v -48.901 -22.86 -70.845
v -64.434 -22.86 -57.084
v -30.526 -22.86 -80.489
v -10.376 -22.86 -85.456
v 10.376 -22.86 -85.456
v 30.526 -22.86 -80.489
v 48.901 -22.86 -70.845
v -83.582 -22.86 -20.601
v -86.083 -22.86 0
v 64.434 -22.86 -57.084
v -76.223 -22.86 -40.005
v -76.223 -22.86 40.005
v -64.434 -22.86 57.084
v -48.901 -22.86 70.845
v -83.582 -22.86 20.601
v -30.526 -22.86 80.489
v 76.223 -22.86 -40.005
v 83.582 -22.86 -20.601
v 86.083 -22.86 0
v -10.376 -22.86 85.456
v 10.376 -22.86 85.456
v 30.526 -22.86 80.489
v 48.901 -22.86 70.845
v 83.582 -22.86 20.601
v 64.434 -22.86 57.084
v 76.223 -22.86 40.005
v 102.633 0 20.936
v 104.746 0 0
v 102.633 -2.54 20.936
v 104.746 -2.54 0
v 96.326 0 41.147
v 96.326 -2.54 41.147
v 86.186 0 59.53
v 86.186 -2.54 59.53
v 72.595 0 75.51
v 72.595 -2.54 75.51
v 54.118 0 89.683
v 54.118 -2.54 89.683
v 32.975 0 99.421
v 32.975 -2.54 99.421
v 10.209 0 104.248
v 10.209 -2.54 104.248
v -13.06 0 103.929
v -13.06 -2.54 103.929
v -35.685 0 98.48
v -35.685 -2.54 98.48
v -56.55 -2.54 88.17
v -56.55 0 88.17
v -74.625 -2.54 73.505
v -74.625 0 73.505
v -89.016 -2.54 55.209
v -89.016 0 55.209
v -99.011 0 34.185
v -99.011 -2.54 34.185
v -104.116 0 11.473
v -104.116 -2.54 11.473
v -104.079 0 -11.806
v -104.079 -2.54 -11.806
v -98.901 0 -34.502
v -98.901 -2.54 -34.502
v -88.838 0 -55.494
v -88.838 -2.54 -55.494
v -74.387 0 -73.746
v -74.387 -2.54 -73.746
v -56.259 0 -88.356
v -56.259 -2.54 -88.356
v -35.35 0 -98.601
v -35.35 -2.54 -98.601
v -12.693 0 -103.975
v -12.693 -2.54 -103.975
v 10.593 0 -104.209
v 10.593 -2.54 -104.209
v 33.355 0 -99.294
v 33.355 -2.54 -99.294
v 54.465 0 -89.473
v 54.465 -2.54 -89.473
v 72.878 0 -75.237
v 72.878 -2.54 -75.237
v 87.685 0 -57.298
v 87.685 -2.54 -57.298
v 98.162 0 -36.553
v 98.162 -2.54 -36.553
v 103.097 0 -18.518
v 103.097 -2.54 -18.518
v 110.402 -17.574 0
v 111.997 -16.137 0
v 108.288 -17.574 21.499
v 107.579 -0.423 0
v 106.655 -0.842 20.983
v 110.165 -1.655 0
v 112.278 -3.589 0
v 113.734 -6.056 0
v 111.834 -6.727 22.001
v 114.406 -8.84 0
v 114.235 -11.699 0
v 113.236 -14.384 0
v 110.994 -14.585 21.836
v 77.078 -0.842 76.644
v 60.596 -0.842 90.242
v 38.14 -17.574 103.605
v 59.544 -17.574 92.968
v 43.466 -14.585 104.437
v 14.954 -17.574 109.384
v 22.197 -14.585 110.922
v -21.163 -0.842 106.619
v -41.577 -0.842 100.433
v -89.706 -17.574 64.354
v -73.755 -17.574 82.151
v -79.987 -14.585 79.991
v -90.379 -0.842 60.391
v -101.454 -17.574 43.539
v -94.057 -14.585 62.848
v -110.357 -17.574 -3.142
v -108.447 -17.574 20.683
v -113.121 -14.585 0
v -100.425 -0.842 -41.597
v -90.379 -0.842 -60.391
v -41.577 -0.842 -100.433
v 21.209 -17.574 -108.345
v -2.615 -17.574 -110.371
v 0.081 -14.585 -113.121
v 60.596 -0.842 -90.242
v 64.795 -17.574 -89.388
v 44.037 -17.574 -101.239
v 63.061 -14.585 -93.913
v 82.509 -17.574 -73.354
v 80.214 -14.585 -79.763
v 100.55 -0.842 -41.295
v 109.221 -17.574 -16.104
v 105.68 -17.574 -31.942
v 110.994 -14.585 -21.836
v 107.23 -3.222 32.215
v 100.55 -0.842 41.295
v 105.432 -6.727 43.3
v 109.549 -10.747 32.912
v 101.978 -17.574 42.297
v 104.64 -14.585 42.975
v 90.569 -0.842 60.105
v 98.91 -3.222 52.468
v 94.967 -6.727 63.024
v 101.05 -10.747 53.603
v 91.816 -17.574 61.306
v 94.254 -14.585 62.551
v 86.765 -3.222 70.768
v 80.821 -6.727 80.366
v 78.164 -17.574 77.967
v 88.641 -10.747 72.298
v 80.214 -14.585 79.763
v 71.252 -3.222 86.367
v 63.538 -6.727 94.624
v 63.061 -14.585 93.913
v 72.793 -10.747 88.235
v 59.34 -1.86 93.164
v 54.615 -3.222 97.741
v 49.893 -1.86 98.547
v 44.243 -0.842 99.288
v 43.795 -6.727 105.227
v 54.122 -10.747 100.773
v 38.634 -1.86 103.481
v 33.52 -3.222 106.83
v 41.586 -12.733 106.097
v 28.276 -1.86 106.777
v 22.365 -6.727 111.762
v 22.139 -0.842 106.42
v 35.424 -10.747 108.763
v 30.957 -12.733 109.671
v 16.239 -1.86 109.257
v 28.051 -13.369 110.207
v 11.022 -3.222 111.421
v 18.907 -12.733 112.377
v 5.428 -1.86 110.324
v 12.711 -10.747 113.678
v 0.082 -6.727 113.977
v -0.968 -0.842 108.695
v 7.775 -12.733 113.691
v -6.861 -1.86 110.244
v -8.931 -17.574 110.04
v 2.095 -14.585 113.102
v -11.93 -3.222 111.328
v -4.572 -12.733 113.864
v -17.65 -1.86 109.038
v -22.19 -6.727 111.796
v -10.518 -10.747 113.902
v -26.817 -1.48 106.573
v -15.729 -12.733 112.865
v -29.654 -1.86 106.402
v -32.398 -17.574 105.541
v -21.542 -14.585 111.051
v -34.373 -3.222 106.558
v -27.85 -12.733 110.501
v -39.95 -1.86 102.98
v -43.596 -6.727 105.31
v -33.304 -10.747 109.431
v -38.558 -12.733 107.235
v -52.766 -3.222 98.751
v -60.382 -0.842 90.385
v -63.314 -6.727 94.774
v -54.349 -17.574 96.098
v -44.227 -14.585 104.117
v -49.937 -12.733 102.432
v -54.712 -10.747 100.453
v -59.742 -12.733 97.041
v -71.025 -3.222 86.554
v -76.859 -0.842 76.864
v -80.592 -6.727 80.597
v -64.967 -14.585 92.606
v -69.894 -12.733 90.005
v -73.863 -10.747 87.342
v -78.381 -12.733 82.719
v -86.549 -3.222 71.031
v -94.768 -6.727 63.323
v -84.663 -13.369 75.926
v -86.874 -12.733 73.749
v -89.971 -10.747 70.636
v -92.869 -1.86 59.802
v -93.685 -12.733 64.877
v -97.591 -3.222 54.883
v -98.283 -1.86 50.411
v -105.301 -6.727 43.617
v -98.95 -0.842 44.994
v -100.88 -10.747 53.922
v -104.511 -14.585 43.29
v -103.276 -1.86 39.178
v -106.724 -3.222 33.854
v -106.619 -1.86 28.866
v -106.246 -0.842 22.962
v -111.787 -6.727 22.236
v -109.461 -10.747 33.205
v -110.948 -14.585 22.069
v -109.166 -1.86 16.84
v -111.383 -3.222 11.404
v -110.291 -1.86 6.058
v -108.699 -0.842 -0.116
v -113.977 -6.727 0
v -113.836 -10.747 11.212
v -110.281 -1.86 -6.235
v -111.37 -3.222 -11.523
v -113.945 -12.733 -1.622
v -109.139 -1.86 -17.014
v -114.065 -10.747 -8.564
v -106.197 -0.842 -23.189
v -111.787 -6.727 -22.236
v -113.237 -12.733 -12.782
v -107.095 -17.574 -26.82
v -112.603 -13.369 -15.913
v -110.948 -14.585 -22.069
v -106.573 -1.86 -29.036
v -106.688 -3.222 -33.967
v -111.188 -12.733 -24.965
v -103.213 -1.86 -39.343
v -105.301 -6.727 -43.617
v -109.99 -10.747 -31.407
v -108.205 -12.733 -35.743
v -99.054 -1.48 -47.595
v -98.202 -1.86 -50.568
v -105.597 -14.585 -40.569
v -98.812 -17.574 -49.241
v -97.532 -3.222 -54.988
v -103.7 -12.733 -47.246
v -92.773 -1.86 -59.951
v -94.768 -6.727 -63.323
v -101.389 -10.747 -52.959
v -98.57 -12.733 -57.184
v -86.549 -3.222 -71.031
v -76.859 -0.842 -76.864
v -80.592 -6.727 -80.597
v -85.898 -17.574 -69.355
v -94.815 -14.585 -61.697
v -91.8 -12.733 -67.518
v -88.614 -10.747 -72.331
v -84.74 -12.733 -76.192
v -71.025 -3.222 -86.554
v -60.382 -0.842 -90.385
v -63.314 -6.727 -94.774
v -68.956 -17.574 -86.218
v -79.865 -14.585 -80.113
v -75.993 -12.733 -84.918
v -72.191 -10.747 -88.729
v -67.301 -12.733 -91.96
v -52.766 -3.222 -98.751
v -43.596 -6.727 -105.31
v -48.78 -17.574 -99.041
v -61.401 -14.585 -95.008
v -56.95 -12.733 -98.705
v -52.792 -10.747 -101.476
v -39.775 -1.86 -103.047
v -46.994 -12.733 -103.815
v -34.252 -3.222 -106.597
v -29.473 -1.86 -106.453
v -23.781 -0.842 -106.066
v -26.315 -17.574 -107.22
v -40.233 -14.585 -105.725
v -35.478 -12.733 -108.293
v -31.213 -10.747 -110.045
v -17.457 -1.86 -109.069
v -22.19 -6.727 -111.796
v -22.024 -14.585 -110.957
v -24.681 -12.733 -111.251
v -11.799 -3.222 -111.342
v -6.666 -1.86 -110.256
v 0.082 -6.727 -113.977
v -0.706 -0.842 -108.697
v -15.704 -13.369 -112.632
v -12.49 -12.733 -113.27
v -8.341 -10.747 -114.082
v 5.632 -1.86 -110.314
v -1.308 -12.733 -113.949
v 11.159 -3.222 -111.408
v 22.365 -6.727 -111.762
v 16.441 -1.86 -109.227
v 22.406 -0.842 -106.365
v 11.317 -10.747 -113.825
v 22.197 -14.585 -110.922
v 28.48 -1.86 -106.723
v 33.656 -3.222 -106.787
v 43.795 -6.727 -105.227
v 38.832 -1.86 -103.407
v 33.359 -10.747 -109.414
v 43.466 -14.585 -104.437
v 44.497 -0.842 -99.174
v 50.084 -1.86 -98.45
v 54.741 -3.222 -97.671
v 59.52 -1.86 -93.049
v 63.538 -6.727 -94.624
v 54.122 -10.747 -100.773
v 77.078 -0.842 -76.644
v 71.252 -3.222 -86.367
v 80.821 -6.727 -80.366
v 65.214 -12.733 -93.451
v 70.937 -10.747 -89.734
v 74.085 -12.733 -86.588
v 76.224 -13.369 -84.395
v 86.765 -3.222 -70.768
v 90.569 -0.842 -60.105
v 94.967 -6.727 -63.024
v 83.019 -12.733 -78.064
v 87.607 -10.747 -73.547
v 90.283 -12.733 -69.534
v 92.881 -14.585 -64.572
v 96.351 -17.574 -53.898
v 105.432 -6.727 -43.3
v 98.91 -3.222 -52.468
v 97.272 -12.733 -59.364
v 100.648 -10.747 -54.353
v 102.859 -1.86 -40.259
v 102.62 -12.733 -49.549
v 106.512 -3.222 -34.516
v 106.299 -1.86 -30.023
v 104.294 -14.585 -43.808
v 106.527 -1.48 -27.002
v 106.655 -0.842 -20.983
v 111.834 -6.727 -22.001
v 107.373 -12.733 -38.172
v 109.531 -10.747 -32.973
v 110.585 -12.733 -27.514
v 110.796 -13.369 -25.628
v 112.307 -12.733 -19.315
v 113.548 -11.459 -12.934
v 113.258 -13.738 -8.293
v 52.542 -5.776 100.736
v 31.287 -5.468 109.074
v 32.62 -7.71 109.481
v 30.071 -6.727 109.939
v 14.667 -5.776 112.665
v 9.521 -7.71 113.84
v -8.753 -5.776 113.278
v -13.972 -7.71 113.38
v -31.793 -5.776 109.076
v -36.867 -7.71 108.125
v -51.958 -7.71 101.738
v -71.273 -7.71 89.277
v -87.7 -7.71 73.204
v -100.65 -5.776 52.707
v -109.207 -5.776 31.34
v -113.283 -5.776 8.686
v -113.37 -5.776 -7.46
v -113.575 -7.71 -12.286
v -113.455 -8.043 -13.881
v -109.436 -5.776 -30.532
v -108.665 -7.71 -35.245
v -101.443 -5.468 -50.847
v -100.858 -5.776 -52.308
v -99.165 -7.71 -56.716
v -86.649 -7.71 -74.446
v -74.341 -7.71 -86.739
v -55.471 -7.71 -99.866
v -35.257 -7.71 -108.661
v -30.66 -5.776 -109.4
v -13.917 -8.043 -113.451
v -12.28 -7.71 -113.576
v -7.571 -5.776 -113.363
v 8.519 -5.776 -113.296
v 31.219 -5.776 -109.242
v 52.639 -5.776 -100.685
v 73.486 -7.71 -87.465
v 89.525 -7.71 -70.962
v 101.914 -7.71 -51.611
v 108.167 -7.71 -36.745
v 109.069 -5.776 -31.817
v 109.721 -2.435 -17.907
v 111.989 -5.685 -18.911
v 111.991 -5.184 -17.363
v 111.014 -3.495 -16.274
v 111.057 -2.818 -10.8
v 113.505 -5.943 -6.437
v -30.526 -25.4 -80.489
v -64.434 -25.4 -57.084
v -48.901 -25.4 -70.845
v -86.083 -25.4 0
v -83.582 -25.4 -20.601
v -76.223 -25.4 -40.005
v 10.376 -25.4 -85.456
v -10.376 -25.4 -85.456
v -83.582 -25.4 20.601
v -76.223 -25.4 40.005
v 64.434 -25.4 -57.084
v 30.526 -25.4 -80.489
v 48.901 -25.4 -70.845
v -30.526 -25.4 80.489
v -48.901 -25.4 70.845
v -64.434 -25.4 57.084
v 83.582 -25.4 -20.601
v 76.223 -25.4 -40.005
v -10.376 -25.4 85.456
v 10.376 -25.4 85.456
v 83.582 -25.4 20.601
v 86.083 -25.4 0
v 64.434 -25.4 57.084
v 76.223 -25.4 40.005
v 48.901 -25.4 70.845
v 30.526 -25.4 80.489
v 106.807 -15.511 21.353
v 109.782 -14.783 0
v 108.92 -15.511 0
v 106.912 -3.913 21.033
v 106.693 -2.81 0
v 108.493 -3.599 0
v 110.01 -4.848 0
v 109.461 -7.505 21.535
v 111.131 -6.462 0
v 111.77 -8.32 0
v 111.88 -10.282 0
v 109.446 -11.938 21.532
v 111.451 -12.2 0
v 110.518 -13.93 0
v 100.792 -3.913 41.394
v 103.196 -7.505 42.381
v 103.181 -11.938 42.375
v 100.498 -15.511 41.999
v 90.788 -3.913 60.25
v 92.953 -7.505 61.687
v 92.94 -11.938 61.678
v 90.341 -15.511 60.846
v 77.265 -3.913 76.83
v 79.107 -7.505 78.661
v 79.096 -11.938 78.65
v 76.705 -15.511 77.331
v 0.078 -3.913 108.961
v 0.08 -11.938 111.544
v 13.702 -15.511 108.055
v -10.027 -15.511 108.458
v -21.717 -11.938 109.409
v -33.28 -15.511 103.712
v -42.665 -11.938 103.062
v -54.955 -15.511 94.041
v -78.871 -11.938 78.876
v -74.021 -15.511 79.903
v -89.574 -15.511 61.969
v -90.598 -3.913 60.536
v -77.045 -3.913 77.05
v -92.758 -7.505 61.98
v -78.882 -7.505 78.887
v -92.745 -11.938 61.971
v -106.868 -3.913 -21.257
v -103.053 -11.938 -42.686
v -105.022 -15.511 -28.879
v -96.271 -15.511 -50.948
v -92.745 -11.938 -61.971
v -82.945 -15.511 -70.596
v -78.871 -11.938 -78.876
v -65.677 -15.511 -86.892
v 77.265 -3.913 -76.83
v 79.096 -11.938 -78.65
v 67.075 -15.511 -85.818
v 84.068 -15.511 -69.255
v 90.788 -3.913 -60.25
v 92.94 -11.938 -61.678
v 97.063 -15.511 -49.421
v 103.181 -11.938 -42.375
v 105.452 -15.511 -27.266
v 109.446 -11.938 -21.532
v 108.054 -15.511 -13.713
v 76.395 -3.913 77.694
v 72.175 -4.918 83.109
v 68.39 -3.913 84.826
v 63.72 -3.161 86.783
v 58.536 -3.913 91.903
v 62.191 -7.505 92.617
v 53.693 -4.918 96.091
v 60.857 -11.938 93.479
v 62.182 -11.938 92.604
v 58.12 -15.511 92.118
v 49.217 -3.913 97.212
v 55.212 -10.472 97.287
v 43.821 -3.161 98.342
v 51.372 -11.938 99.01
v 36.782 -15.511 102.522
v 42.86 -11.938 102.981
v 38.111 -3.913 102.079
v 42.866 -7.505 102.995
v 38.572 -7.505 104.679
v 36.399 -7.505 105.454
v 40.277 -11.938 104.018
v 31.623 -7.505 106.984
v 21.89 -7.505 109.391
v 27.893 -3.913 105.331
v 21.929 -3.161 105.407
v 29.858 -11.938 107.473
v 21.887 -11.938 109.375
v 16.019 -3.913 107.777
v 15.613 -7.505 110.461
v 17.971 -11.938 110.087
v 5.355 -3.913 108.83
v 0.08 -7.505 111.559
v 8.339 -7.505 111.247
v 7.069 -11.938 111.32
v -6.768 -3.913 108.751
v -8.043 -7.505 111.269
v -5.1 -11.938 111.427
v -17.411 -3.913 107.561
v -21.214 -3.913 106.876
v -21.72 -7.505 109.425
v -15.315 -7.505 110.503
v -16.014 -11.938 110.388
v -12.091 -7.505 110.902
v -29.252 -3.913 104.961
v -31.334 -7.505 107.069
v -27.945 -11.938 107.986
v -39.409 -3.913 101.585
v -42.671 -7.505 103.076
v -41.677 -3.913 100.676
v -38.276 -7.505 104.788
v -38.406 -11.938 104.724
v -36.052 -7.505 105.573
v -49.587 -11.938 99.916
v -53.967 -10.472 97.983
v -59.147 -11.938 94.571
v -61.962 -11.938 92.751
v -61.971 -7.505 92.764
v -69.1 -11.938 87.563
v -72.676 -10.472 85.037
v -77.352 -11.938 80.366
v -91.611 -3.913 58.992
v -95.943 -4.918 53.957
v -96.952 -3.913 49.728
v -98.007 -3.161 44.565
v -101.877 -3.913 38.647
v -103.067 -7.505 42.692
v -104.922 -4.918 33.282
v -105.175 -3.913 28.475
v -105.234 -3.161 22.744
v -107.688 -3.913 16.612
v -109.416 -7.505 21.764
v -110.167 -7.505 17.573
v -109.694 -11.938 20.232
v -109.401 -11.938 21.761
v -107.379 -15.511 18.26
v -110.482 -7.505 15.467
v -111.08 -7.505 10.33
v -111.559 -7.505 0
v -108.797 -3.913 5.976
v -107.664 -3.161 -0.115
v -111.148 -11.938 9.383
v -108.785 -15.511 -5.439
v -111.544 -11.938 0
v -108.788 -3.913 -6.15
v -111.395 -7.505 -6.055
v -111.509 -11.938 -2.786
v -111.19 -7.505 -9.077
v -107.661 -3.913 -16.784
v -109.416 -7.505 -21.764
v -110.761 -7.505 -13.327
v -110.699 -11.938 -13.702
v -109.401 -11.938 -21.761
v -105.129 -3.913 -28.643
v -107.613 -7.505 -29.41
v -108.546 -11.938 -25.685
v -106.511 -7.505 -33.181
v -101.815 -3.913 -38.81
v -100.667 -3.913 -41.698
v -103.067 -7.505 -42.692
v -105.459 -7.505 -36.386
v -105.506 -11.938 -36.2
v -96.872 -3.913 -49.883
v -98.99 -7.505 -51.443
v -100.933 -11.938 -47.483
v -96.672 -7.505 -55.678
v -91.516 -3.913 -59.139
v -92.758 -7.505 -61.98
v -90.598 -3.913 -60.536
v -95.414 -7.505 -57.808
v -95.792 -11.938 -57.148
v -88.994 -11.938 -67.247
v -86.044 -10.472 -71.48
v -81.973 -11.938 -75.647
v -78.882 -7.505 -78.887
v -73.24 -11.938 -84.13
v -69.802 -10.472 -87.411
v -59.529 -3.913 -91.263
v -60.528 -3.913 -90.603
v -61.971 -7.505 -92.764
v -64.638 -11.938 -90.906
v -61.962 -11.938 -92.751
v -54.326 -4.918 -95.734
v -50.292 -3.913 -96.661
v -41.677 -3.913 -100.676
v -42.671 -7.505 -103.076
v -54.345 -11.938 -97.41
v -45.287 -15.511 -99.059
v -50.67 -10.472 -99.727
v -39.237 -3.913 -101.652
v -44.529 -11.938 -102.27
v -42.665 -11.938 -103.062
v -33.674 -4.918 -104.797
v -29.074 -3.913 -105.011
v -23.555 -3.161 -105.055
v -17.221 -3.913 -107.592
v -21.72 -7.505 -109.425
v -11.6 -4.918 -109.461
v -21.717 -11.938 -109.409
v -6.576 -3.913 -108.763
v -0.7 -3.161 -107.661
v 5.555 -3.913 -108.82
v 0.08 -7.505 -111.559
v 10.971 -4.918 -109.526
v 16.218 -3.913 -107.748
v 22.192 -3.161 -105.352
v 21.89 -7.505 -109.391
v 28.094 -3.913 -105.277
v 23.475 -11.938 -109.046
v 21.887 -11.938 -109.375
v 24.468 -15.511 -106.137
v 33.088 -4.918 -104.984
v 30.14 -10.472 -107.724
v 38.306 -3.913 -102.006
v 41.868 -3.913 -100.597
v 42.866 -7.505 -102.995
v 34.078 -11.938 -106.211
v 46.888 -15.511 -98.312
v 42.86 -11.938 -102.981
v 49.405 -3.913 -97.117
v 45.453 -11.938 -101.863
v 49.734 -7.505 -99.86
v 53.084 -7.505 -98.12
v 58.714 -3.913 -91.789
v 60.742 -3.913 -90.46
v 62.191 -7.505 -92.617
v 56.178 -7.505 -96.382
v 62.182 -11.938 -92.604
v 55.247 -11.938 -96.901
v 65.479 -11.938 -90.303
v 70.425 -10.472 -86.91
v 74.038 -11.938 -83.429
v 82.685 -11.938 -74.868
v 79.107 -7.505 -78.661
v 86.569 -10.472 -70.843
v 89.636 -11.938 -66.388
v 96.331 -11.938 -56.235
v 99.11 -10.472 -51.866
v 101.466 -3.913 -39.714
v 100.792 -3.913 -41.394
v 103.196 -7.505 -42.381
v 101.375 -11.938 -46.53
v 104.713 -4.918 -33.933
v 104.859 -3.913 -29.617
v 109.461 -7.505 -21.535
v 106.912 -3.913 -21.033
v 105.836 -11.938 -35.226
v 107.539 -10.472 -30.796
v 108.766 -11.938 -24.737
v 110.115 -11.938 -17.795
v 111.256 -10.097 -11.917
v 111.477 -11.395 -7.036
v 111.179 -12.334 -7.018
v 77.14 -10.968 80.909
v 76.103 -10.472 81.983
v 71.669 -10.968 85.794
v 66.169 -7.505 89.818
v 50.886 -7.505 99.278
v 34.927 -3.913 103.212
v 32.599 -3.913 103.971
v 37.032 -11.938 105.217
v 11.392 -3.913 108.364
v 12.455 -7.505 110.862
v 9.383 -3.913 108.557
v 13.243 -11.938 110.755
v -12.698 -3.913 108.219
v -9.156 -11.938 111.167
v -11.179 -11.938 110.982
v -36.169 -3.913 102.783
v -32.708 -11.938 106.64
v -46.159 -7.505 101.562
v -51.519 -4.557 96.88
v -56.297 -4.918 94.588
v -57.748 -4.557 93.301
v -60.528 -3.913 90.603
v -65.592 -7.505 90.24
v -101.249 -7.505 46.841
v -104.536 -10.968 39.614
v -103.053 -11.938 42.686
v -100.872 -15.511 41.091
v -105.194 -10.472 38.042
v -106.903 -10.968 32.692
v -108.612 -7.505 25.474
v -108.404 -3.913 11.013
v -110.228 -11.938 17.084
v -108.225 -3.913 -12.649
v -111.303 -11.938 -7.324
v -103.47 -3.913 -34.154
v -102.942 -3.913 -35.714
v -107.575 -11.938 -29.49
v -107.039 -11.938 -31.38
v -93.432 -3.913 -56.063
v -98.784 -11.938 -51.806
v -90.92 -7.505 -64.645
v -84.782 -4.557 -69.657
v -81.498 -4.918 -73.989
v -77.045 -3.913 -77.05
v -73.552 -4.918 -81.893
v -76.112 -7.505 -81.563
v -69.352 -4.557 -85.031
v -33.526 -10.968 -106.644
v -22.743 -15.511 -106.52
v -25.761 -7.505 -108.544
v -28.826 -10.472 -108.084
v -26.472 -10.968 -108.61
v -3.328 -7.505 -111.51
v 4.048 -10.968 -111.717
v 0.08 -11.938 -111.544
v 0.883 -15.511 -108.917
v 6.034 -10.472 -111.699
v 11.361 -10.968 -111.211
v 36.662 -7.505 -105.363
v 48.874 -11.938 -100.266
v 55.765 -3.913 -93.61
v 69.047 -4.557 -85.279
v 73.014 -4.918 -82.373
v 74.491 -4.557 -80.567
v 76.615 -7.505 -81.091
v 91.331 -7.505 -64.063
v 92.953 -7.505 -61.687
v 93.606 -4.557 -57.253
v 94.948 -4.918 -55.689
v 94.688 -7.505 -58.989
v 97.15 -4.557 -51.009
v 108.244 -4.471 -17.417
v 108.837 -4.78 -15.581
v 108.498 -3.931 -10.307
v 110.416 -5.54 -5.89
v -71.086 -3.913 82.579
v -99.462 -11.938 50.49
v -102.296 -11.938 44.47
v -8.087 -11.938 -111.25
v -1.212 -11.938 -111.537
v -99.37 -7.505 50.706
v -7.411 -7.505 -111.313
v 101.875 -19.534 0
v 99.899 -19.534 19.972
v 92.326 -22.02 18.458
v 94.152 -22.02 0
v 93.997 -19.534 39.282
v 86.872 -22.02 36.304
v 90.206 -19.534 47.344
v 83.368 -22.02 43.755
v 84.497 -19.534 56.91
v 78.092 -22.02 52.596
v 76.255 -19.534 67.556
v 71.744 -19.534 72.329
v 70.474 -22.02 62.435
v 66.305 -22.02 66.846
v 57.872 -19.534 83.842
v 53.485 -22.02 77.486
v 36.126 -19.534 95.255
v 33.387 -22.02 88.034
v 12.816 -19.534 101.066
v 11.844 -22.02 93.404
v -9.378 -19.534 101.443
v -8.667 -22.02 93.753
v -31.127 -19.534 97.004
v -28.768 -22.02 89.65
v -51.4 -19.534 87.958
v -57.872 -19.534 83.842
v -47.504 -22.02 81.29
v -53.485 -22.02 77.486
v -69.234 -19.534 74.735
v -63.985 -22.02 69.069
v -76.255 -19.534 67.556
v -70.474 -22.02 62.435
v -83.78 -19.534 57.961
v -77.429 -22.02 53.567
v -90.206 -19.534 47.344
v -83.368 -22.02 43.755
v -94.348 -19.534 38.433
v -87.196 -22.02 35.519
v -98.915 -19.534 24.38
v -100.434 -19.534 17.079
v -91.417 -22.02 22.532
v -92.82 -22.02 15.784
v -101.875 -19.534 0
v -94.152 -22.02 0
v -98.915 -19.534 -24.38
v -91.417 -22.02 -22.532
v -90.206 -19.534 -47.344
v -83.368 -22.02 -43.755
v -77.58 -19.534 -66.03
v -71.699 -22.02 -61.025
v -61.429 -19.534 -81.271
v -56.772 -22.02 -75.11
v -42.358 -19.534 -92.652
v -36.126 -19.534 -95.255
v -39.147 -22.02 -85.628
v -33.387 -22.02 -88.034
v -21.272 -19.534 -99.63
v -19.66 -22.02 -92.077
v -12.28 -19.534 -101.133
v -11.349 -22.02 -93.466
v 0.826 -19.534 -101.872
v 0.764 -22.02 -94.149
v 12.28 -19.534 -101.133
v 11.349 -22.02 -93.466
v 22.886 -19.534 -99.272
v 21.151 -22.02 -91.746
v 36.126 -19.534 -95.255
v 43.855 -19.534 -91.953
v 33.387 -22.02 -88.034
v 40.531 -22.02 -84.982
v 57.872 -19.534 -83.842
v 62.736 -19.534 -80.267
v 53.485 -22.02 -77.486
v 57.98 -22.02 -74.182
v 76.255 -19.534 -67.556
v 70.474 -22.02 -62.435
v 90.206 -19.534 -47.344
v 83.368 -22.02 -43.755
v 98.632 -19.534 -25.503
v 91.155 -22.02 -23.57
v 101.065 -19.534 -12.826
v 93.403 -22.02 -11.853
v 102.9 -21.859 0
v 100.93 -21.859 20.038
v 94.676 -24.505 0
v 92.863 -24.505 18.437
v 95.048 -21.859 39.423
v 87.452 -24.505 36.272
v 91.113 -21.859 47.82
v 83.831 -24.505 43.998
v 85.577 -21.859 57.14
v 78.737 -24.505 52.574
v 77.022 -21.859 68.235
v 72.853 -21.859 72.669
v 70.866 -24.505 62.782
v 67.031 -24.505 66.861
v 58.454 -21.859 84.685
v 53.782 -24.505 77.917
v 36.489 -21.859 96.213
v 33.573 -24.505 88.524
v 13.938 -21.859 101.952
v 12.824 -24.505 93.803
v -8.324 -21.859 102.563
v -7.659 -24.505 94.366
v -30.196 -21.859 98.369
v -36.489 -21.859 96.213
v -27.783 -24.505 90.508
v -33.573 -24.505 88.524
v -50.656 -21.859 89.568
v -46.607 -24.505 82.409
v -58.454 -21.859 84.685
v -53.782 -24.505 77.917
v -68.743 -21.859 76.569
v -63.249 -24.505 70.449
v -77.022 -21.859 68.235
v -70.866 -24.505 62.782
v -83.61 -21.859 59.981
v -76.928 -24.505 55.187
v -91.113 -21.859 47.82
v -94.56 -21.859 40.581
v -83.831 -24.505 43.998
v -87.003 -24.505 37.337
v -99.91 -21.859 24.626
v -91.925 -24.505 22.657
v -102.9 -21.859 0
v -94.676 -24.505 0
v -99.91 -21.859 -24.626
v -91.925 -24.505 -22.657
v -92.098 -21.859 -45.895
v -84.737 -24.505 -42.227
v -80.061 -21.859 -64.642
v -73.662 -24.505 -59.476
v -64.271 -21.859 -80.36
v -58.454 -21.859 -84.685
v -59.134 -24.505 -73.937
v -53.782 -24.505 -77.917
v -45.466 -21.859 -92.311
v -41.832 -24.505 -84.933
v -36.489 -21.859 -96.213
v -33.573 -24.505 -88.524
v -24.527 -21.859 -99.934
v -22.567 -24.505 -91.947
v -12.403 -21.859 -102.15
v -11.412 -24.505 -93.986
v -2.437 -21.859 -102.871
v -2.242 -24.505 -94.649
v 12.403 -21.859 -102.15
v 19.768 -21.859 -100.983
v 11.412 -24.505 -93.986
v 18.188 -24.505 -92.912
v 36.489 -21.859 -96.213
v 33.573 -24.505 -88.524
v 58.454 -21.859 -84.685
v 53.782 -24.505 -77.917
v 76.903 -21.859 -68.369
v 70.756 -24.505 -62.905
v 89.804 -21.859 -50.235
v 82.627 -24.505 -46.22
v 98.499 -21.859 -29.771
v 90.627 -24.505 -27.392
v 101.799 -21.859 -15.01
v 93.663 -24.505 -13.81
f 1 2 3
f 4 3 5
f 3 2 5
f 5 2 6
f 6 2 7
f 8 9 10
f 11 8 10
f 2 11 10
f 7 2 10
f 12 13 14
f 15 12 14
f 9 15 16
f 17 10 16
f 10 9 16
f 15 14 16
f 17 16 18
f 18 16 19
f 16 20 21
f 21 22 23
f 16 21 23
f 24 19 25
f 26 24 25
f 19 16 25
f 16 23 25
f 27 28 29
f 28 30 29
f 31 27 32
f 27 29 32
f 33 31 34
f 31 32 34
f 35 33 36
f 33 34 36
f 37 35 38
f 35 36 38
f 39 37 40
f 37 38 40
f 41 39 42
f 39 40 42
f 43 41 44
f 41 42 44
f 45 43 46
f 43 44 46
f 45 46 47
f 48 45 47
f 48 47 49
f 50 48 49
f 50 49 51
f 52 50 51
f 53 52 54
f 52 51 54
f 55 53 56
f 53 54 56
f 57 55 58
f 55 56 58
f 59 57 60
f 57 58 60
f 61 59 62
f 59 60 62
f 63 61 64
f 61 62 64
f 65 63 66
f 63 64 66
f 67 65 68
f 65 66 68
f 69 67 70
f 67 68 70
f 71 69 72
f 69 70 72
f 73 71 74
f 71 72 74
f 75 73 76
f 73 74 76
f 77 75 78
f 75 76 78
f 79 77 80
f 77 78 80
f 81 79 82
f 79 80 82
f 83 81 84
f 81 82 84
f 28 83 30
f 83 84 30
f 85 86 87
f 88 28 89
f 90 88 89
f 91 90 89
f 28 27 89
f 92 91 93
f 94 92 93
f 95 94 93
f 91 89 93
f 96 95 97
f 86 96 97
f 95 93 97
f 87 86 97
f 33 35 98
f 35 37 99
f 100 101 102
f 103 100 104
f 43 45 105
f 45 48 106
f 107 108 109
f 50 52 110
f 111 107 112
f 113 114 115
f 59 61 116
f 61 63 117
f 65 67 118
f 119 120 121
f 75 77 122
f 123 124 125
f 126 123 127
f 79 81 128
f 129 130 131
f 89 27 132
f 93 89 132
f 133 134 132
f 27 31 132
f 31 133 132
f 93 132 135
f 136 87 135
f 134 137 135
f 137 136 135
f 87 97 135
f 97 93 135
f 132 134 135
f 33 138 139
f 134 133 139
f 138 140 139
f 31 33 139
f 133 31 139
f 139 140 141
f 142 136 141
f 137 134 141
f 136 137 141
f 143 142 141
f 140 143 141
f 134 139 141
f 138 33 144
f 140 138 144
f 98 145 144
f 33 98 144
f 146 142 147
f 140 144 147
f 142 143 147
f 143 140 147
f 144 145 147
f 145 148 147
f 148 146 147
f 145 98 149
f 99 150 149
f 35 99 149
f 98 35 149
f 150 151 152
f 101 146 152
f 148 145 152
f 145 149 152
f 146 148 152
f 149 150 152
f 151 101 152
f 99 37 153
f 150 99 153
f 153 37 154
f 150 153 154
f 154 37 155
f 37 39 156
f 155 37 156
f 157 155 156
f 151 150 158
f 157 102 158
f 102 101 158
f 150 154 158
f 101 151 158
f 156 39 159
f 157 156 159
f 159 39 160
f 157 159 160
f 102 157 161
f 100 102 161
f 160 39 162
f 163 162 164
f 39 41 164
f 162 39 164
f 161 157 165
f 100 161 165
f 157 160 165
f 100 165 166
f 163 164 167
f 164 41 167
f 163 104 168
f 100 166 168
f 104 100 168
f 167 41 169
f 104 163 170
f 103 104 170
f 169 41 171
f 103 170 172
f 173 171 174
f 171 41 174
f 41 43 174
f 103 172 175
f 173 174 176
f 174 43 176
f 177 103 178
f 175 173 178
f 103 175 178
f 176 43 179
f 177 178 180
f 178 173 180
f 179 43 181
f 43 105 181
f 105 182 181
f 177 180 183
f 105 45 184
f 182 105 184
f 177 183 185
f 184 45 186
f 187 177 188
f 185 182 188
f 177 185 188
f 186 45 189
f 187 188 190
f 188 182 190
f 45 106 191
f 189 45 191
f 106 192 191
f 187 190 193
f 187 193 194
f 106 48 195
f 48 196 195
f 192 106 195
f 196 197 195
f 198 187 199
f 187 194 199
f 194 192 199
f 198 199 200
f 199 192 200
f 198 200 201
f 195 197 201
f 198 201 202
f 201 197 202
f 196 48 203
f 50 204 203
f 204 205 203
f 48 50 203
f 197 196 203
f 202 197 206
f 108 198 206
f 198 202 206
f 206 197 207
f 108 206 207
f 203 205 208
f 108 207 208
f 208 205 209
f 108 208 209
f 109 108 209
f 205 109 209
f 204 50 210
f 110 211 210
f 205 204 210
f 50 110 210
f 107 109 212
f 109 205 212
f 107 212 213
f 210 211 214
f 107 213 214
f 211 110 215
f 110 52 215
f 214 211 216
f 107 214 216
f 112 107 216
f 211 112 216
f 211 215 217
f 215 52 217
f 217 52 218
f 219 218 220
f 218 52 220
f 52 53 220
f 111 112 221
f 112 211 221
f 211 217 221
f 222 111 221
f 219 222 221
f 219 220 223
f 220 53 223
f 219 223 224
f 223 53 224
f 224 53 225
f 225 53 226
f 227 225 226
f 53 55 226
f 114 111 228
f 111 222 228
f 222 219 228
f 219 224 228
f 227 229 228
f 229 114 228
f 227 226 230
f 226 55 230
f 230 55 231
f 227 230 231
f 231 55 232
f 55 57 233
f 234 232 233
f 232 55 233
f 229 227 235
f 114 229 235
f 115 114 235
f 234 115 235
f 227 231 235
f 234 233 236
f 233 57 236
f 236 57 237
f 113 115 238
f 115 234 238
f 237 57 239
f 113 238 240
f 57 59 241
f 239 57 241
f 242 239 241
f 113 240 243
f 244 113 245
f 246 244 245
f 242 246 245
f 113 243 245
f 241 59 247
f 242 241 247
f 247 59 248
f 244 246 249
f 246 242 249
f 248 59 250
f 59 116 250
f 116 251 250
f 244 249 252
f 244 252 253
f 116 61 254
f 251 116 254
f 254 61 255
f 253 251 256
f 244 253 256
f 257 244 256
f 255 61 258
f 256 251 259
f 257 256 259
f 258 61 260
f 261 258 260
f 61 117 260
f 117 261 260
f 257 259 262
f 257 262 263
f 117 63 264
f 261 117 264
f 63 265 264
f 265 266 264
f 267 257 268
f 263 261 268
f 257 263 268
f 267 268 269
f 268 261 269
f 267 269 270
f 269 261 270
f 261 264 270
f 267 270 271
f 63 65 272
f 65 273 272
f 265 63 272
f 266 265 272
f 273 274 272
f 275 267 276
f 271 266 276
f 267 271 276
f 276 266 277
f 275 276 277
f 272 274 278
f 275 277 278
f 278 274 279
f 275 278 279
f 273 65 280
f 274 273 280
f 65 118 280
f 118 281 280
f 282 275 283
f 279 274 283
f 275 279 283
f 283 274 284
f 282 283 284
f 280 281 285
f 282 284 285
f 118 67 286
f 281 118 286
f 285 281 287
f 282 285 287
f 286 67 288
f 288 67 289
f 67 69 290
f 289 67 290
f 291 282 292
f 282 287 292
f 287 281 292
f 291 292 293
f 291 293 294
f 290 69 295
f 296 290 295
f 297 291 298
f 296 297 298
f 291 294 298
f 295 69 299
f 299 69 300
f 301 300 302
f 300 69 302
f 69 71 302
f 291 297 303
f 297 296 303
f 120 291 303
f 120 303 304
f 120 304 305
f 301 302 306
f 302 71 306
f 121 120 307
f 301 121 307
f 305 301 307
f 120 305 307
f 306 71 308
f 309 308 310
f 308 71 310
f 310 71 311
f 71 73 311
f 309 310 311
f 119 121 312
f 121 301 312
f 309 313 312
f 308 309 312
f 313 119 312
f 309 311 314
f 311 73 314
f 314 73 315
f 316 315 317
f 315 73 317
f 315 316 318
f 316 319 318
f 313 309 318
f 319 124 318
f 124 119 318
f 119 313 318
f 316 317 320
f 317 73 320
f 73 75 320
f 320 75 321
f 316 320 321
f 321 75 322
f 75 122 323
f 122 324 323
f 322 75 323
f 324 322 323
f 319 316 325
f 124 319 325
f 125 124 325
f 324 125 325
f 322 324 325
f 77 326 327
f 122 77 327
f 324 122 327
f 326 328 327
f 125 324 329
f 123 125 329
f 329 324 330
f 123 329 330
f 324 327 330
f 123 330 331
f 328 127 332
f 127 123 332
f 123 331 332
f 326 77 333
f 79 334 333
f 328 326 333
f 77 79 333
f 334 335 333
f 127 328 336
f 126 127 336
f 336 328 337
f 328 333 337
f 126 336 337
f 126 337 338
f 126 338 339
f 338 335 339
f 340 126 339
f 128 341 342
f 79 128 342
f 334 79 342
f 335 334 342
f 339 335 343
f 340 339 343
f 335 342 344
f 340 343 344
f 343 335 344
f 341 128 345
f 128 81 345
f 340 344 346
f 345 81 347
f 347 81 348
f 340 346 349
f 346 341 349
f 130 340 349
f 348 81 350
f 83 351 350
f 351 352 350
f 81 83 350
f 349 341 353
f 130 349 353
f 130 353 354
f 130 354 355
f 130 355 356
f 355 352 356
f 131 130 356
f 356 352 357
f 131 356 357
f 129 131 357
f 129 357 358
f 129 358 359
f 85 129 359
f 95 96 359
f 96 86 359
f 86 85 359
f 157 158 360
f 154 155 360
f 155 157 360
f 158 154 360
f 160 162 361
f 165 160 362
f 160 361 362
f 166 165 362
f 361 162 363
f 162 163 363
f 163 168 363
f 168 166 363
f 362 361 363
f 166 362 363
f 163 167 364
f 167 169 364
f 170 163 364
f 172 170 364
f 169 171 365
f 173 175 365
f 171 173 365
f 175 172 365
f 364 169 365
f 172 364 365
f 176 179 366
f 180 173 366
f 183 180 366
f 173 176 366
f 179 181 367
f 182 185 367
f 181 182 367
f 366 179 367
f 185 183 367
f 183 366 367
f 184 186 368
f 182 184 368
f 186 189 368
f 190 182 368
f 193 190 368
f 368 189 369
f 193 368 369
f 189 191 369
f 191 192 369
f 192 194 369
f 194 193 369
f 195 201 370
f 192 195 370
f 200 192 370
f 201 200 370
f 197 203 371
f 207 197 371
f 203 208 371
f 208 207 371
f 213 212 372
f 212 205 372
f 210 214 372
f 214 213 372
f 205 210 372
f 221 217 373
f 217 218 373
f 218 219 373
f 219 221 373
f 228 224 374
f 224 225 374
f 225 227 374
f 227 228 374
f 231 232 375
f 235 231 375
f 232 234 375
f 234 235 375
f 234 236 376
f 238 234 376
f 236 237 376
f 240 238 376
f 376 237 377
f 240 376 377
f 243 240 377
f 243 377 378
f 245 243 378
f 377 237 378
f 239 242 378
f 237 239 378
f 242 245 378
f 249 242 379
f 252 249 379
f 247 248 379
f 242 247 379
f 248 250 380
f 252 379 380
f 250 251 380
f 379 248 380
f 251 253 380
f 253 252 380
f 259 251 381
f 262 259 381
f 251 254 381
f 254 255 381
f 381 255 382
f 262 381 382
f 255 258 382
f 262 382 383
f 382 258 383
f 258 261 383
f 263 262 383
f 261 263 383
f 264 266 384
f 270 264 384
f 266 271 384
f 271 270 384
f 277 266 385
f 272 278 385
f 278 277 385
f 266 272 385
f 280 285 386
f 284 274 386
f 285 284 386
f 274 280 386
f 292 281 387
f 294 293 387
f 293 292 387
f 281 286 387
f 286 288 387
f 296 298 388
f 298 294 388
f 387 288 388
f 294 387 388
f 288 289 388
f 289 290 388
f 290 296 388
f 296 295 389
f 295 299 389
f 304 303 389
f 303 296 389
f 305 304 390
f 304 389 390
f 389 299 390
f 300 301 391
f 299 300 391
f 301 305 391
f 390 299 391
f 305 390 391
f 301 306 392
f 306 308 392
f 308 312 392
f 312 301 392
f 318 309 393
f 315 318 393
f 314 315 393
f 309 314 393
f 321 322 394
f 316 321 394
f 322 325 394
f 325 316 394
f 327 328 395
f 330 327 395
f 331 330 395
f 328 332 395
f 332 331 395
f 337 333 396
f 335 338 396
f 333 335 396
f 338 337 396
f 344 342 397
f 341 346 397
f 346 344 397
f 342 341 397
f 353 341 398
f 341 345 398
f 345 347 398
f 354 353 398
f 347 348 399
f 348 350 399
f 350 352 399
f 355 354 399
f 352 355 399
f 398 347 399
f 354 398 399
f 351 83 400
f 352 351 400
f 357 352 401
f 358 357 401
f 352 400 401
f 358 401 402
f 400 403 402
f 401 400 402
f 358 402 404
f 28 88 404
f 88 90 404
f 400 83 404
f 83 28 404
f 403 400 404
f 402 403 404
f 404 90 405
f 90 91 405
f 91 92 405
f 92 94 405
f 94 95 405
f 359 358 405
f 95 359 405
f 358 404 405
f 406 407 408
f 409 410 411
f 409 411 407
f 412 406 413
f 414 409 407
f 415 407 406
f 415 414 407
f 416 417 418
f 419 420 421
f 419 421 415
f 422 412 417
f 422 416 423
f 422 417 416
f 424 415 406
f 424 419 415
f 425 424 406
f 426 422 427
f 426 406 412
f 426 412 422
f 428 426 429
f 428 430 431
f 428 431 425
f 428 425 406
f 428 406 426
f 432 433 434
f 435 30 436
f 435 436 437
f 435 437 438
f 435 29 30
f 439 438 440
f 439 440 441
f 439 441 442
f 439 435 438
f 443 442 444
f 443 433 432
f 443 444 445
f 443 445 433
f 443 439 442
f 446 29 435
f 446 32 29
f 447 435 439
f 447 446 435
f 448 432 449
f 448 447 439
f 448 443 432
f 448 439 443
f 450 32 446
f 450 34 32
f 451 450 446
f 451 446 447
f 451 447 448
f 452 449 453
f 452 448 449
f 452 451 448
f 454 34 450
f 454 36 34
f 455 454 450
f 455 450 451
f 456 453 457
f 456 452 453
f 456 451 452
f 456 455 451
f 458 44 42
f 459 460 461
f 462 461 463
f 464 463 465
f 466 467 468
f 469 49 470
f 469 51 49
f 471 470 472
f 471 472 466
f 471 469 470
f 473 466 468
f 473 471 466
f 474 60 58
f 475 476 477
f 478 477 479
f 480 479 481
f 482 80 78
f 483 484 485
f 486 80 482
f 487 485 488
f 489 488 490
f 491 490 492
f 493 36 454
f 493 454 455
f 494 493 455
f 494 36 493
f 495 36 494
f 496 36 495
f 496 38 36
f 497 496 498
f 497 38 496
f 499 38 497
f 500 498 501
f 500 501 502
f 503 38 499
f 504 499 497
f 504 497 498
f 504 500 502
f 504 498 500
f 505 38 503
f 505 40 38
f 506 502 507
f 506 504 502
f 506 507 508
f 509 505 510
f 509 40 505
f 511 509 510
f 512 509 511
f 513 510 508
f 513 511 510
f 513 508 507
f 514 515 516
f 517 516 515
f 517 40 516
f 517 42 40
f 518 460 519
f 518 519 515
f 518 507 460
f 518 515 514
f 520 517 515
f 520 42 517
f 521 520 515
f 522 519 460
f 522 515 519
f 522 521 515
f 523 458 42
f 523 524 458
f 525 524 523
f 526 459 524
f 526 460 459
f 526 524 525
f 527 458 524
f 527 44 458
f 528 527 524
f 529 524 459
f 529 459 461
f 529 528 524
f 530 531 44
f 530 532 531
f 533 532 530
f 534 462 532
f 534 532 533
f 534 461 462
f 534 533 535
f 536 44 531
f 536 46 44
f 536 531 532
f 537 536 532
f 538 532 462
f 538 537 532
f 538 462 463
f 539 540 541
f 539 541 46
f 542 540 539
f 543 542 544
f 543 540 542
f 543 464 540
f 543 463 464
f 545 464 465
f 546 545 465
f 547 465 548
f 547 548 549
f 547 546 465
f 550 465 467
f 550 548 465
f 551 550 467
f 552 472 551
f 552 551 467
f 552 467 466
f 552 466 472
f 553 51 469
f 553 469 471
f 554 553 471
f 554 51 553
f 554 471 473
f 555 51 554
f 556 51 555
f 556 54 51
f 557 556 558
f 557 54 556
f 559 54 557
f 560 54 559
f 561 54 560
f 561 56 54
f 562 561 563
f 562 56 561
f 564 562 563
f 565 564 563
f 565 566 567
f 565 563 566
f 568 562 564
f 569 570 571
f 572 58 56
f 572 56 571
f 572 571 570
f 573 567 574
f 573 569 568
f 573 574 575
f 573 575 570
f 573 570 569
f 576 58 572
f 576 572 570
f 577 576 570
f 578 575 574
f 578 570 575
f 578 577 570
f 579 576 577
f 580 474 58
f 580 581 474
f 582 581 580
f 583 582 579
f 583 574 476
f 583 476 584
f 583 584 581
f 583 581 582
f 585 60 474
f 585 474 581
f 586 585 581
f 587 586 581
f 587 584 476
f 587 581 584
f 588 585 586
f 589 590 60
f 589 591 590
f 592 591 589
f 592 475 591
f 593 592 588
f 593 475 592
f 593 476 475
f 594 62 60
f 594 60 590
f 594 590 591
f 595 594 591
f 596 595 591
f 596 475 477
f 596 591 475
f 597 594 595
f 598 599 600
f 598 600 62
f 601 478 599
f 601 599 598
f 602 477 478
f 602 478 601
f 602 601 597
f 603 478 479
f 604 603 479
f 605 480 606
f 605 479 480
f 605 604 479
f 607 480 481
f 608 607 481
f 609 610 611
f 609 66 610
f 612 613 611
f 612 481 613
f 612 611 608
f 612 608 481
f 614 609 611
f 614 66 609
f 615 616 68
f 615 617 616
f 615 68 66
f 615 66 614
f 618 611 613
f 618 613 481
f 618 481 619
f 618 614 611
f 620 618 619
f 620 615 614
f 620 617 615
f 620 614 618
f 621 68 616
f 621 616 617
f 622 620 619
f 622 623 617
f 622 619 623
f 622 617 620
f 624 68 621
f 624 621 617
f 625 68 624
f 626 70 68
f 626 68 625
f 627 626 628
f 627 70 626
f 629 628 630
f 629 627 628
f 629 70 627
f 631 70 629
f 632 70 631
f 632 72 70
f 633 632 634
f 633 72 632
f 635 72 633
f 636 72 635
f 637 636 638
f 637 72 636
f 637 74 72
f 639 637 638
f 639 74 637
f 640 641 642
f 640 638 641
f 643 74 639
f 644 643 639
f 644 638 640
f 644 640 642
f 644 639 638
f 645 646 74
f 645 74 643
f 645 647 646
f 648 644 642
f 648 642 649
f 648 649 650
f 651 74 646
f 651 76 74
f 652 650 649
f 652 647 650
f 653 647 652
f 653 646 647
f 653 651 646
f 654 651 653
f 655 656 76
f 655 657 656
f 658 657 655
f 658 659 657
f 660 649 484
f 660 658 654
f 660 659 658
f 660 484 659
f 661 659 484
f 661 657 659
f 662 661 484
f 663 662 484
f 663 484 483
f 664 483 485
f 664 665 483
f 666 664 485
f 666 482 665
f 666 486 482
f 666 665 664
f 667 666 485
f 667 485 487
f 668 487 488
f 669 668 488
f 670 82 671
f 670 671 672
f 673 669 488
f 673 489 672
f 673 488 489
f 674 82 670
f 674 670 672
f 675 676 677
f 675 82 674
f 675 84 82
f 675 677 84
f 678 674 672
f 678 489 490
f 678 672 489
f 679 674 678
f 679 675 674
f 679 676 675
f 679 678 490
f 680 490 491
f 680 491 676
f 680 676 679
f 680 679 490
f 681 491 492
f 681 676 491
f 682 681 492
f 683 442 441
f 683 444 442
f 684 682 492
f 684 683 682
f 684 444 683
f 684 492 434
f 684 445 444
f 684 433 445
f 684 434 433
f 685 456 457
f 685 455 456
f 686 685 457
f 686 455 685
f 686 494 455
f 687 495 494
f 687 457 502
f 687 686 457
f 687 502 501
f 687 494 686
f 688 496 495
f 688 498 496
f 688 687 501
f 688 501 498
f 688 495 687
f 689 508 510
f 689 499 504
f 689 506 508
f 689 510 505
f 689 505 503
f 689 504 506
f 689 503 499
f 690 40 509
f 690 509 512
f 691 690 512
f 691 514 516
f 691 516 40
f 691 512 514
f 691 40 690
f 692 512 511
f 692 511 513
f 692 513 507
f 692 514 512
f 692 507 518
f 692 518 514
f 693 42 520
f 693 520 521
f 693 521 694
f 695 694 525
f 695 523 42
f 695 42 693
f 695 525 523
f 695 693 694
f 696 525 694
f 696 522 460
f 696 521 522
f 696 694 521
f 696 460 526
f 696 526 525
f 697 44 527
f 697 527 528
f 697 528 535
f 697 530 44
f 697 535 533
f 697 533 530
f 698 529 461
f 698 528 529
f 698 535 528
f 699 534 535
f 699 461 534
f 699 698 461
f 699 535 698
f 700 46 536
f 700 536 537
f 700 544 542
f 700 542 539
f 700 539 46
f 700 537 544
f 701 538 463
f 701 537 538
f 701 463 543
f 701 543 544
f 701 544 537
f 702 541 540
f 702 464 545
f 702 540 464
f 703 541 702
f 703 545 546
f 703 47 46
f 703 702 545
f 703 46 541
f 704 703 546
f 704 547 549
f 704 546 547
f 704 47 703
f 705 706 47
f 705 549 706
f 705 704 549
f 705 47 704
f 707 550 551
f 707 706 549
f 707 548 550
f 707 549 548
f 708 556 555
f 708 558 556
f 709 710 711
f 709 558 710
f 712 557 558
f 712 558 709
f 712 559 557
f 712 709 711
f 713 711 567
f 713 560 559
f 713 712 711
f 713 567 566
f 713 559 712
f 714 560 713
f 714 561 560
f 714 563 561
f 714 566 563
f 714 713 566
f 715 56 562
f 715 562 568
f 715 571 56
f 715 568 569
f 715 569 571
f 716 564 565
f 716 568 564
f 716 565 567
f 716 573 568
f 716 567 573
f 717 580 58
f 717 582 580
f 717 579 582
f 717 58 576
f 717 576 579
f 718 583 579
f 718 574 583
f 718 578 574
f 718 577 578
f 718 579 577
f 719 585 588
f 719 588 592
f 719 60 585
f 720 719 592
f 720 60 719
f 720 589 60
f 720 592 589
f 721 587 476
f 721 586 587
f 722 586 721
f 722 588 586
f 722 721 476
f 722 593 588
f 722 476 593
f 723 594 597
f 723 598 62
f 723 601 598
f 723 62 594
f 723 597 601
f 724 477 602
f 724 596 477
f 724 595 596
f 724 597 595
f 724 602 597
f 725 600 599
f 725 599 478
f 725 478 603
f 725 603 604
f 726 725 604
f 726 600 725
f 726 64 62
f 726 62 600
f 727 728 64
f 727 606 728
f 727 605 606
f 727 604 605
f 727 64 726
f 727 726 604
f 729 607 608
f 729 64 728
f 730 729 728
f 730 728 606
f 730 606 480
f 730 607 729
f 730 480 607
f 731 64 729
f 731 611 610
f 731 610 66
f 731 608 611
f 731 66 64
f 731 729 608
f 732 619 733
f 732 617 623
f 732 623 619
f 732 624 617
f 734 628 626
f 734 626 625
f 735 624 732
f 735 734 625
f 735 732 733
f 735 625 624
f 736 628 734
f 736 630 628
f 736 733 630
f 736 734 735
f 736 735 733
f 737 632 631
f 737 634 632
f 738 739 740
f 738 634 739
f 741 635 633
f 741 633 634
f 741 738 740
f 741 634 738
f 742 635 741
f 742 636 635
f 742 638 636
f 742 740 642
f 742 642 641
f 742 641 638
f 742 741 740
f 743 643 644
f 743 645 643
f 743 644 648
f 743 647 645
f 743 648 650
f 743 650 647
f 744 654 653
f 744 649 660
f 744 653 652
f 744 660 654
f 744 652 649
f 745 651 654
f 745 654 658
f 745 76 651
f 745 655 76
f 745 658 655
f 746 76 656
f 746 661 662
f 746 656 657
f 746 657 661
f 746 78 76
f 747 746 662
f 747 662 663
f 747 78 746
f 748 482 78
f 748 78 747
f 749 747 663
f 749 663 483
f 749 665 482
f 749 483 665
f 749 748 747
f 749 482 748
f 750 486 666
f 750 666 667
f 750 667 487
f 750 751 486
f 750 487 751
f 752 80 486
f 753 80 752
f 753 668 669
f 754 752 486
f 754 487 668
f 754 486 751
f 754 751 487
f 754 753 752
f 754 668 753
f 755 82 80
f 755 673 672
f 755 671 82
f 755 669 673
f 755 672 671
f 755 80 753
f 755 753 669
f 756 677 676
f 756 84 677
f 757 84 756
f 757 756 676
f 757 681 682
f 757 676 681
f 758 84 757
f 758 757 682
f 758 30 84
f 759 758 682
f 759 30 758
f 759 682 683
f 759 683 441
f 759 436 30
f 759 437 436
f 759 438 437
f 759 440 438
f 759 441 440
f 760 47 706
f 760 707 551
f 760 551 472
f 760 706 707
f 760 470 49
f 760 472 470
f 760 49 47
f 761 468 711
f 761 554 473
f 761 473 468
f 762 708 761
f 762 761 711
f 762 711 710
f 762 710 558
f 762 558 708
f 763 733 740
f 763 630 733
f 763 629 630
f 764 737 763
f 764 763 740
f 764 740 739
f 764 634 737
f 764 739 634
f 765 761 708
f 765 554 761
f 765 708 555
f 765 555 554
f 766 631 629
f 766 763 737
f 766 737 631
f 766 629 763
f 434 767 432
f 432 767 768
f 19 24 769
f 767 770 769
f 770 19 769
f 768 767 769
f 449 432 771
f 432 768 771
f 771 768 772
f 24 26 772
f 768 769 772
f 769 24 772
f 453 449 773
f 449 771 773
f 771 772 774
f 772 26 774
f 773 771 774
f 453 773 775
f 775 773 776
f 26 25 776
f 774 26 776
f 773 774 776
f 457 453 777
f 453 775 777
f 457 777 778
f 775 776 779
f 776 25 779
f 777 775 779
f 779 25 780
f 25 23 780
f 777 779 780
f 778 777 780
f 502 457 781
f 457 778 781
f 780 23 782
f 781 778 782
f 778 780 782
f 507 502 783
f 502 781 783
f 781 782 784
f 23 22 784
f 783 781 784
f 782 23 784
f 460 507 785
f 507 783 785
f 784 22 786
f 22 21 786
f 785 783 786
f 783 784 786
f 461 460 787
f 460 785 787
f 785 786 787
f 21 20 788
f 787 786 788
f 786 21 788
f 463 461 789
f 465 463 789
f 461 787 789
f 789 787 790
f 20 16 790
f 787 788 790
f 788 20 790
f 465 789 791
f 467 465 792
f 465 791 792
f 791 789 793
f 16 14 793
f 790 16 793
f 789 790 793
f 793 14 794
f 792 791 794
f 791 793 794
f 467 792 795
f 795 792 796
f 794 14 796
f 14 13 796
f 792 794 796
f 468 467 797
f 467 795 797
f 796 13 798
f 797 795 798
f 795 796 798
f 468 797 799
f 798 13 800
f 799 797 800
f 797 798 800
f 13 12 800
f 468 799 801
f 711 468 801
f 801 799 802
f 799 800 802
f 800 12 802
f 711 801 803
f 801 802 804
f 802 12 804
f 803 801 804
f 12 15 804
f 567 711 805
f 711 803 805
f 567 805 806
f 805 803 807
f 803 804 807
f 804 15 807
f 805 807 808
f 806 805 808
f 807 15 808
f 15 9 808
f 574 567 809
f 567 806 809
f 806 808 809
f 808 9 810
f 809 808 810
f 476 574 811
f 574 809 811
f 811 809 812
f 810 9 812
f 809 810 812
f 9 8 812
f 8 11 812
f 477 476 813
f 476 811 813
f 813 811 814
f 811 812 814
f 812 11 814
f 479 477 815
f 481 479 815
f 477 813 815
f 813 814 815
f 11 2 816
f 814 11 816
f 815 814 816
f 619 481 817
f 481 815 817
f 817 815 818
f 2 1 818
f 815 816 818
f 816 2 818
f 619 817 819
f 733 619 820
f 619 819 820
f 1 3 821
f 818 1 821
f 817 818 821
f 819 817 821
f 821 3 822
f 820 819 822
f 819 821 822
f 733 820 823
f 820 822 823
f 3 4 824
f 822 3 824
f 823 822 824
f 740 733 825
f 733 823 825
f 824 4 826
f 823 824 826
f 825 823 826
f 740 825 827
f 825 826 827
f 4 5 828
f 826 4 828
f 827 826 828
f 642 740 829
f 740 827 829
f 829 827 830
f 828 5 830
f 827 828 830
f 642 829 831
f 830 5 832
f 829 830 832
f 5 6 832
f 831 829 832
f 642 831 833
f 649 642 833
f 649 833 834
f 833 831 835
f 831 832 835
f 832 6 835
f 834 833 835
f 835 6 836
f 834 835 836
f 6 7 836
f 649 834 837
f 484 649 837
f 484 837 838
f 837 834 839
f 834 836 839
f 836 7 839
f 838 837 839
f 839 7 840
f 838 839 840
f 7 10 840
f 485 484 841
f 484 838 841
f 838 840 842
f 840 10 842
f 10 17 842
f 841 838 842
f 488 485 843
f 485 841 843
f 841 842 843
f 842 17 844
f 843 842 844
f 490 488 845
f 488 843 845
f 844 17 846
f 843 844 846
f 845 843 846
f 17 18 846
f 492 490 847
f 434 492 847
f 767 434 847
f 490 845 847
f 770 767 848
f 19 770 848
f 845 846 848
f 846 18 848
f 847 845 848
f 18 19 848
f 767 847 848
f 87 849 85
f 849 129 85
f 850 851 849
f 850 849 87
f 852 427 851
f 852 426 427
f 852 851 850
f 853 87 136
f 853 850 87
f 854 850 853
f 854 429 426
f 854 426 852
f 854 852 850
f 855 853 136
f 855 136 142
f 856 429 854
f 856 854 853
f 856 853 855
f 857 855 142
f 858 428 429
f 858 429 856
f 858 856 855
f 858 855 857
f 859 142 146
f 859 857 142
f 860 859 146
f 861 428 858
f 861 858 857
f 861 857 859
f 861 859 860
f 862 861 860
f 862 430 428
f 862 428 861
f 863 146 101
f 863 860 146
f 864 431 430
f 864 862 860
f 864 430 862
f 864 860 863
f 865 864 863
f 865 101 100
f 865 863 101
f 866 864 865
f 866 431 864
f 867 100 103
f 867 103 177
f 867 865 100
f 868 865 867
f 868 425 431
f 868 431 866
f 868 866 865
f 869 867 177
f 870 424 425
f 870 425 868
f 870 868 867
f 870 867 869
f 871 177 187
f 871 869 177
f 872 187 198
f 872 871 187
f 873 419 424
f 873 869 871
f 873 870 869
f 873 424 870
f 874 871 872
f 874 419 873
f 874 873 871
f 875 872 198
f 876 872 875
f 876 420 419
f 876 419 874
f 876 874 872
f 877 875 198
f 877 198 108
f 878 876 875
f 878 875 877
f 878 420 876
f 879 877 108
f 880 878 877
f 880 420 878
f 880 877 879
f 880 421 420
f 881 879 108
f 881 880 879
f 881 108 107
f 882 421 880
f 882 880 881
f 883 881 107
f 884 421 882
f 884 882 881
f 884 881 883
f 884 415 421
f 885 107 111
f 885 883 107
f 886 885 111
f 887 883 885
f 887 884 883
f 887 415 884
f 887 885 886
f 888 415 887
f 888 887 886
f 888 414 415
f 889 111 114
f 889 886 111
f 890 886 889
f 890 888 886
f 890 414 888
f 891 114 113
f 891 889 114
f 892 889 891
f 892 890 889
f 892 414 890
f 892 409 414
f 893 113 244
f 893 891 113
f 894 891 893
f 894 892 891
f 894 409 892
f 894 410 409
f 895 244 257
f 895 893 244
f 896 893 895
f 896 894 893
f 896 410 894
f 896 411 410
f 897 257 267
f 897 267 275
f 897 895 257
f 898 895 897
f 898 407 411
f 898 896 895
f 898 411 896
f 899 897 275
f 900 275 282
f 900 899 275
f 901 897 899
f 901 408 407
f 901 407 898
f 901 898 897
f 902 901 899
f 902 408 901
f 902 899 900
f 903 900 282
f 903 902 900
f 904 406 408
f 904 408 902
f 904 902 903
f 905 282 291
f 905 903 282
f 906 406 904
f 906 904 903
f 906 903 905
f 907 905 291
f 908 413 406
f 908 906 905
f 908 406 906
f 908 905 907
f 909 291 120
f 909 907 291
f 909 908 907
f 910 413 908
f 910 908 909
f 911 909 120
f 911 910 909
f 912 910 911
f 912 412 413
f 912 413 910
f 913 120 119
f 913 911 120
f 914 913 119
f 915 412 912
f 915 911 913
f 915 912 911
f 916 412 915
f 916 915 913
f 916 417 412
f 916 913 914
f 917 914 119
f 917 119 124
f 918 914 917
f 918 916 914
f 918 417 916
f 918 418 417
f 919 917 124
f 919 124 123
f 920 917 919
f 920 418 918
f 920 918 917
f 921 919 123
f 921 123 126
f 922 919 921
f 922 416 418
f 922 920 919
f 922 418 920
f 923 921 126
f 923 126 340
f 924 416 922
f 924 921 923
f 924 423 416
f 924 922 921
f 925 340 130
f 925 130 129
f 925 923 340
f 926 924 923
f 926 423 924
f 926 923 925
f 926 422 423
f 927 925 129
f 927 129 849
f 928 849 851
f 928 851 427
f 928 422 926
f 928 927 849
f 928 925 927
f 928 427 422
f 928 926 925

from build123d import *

# Parameters (mm, degrees)
F2_R     = 124.464334162
F3_DEPTH = 25.4
F5_R     = 9.6970890036
F6_T     = 2.54


# Not quite as in the source:
# - a fillet or chamfer that OpenCascade refuses, or shapes differently, is made with other operations: its cross-section is extruded or revolved along the edge and cut away or added
# - a shell that OpenCascade refuses in one call is made with other operations: the cavity is built on its own and cut out


with BuildPart() as f3:
    # F2 (on Front) → F3 (new body)
    with BuildSketch(Plane.XZ):
        Circle(F2_R)
    extrude(amount=F3_DEPTH)

    # F4: fillet of radius 41.6982966493 on 1 edges, made by hand

    # F4_s1 → F4_t2 (revolve, cut)
    with BuildSketch(Plane.XY):
        with BuildLine():
            ThreePointArc((124.464334162, 0), (109.0955263093, -18.4749628471), (86.0831738123, -25.4))
            Line((86.0831738123, -25.4), (124.464334162, -25.4))
            Line((124.464334162, -25.4), (124.464334162, 0))
        make_face()
    revolve(axis=Axis((0, -25.4, 0), (0, -1, 0)), mode=Mode.SUBTRACT)

    # F5
    f5_edges = [f3.edges().sort_by_distance(p)[0] for p in [
        (-124.464334, 0, 0),
    ]]
    fillet(f5_edges, radius=F5_R)

    # F6: shell of thickness 2.54, made by hand


with BuildPart() as f6_core1:
    # F6_t2: copy of F3
    add(f3.part)

    # the walls: a layer under each face that stays
    f6_faces = [f6_core1.faces().sort_by_distance(p)[0] for p in [
        (-113.9773406634, -6.7265898841, 0),
        (-98.8565693577, -23.3953843301, 0),
        (0, -25.4, 0),
    ]]
    thicken(f6_faces, amount=-F6_T, mode=Mode.SUBTRACT)


with BuildPart() as f3_1:
    add(f3.part)

    # what is left inside the walls is the cavity
    f6_cavity = [f6_core1.part.solids().sort_by_distance(p)[0] for p in [
        (0, -0.0254, -39.133226),
    ]]
    add(f6_cavity, mode=Mode.SUBTRACT)


solid = f3_1.part
